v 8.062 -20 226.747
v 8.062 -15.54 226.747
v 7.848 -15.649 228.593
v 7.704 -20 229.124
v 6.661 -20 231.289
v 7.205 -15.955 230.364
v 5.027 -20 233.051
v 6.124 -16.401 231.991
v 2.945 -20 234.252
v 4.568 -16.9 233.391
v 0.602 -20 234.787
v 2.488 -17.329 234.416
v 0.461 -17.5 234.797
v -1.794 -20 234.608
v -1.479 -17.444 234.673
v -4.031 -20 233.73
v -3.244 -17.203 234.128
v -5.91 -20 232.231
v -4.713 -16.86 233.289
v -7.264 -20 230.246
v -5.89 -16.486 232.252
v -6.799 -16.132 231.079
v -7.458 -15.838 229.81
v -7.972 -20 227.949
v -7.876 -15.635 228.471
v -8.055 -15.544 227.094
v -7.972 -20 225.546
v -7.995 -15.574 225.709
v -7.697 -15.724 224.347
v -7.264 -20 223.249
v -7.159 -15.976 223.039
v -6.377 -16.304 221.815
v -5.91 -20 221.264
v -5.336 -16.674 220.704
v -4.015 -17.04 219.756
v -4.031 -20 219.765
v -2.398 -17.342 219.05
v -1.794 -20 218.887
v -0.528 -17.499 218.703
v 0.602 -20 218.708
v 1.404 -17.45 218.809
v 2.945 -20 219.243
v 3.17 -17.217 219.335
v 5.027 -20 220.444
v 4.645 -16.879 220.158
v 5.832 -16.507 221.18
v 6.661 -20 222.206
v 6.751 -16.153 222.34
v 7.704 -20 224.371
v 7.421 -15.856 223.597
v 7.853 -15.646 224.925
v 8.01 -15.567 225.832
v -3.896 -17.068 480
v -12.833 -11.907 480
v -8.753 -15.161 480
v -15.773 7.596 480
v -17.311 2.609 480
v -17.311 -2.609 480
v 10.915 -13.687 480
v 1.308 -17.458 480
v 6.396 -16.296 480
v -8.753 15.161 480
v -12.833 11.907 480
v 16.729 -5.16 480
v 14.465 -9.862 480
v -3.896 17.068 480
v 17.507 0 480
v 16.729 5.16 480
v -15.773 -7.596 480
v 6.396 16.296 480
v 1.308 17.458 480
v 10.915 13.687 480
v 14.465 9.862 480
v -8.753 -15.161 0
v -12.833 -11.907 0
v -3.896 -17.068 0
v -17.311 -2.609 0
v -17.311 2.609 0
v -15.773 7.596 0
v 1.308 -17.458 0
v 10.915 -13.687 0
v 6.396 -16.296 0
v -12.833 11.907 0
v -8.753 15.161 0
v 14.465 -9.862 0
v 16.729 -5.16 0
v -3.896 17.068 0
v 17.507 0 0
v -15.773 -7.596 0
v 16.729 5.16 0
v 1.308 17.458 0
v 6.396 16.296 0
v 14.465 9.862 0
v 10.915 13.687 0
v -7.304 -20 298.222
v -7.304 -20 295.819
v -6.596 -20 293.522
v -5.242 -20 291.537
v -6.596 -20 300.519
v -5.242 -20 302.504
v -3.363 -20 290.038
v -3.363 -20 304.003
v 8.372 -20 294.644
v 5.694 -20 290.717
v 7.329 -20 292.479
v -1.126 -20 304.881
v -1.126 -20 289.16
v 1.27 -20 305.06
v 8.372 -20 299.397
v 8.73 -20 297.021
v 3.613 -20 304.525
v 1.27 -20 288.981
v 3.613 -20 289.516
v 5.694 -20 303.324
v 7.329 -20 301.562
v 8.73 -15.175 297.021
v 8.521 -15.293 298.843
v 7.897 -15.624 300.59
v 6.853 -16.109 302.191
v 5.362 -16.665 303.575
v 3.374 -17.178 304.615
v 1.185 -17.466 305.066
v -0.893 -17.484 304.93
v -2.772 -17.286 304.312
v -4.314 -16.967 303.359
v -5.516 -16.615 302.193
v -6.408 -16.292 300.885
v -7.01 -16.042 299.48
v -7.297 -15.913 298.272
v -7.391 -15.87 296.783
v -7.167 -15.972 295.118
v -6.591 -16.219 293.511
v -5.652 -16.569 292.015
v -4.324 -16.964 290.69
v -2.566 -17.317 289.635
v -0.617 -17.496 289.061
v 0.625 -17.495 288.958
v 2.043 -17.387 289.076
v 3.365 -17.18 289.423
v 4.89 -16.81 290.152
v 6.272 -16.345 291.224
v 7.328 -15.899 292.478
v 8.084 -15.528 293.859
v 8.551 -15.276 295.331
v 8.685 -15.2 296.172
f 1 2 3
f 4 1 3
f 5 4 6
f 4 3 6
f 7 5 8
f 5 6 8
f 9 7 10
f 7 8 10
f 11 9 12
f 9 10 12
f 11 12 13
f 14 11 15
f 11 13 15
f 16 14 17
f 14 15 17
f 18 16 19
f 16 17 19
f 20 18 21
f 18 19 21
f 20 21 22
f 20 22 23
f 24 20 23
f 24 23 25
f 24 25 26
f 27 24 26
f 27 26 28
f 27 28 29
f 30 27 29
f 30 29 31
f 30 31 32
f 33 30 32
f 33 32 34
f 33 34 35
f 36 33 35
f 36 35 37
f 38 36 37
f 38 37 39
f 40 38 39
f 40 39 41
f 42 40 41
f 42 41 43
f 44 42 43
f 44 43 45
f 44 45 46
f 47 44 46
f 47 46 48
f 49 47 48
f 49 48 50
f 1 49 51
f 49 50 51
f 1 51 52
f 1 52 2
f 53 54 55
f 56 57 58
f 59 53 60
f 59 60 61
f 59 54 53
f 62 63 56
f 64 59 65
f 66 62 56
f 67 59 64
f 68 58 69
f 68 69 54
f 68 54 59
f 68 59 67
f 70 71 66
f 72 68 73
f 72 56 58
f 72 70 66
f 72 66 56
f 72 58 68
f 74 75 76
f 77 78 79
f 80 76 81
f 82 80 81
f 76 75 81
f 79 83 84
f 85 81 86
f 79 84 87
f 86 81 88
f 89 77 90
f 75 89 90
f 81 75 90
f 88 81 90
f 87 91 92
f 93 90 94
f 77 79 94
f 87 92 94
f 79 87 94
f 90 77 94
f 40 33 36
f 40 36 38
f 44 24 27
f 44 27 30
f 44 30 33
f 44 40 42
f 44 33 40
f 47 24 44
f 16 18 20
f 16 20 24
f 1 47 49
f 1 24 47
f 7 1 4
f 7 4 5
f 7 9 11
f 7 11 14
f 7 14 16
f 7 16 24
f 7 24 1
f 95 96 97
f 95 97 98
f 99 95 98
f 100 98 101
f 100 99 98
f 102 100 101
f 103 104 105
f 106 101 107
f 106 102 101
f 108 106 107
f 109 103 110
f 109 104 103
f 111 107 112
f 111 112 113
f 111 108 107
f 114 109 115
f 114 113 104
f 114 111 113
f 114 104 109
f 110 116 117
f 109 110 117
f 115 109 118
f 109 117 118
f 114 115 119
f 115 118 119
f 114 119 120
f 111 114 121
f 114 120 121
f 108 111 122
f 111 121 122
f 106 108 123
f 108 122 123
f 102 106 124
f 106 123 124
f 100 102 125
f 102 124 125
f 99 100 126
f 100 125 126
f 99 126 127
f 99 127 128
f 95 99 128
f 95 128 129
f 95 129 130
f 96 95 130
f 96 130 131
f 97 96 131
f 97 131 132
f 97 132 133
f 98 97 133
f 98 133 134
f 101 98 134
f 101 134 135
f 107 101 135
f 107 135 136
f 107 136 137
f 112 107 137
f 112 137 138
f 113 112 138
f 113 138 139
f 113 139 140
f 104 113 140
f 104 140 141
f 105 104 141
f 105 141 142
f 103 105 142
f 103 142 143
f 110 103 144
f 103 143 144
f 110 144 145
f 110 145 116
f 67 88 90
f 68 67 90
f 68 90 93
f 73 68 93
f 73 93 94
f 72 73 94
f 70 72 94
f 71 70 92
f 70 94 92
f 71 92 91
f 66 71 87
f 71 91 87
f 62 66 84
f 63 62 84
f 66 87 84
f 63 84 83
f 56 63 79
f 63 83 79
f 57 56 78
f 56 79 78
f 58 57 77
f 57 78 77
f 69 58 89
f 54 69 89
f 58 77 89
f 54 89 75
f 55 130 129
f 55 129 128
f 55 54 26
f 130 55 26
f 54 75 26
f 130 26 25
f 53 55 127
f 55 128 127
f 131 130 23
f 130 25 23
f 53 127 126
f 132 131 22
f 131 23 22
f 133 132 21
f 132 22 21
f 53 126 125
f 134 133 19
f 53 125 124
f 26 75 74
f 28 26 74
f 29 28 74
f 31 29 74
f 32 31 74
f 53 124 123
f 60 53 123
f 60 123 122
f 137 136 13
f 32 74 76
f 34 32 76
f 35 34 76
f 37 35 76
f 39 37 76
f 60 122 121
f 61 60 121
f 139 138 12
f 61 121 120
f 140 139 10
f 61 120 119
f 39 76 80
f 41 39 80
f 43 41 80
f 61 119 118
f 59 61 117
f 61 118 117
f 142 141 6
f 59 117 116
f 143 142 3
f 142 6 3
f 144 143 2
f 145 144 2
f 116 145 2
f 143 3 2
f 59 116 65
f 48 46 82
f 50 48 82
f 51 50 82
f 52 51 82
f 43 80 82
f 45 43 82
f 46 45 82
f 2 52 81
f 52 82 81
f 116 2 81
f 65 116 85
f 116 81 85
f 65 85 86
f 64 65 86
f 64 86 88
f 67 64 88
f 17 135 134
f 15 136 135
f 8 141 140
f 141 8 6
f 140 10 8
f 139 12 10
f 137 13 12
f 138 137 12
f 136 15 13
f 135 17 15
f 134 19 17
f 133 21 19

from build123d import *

# Parameters (mm, degrees)
F0_R     = 17.506555
F1_DEPTH = 480
F2_R     = 8.062213
F3_DEPTH = 20
F4_R     = 8.062213
F5_DEPTH = 20


with BuildPart() as f1:
    # F0 (on Top) → F1 (new body)
    with BuildSketch(Plane.XY):
        Circle(F0_R)
    extrude(amount=F1_DEPTH)

    # F2 (on Front) → F3 (join)
    with BuildSketch(Plane.XZ):
        with Locations((0, 226.747483)):
            Circle(F2_R)
    extrude(amount=F3_DEPTH)

    # F4 (on Front) → F5 (join)
    with BuildSketch(Plane.XZ):
        with Locations((0.667743, 297.020525)):
            Circle(F4_R)
    extrude(amount=F5_DEPTH)


solid = f1.part
